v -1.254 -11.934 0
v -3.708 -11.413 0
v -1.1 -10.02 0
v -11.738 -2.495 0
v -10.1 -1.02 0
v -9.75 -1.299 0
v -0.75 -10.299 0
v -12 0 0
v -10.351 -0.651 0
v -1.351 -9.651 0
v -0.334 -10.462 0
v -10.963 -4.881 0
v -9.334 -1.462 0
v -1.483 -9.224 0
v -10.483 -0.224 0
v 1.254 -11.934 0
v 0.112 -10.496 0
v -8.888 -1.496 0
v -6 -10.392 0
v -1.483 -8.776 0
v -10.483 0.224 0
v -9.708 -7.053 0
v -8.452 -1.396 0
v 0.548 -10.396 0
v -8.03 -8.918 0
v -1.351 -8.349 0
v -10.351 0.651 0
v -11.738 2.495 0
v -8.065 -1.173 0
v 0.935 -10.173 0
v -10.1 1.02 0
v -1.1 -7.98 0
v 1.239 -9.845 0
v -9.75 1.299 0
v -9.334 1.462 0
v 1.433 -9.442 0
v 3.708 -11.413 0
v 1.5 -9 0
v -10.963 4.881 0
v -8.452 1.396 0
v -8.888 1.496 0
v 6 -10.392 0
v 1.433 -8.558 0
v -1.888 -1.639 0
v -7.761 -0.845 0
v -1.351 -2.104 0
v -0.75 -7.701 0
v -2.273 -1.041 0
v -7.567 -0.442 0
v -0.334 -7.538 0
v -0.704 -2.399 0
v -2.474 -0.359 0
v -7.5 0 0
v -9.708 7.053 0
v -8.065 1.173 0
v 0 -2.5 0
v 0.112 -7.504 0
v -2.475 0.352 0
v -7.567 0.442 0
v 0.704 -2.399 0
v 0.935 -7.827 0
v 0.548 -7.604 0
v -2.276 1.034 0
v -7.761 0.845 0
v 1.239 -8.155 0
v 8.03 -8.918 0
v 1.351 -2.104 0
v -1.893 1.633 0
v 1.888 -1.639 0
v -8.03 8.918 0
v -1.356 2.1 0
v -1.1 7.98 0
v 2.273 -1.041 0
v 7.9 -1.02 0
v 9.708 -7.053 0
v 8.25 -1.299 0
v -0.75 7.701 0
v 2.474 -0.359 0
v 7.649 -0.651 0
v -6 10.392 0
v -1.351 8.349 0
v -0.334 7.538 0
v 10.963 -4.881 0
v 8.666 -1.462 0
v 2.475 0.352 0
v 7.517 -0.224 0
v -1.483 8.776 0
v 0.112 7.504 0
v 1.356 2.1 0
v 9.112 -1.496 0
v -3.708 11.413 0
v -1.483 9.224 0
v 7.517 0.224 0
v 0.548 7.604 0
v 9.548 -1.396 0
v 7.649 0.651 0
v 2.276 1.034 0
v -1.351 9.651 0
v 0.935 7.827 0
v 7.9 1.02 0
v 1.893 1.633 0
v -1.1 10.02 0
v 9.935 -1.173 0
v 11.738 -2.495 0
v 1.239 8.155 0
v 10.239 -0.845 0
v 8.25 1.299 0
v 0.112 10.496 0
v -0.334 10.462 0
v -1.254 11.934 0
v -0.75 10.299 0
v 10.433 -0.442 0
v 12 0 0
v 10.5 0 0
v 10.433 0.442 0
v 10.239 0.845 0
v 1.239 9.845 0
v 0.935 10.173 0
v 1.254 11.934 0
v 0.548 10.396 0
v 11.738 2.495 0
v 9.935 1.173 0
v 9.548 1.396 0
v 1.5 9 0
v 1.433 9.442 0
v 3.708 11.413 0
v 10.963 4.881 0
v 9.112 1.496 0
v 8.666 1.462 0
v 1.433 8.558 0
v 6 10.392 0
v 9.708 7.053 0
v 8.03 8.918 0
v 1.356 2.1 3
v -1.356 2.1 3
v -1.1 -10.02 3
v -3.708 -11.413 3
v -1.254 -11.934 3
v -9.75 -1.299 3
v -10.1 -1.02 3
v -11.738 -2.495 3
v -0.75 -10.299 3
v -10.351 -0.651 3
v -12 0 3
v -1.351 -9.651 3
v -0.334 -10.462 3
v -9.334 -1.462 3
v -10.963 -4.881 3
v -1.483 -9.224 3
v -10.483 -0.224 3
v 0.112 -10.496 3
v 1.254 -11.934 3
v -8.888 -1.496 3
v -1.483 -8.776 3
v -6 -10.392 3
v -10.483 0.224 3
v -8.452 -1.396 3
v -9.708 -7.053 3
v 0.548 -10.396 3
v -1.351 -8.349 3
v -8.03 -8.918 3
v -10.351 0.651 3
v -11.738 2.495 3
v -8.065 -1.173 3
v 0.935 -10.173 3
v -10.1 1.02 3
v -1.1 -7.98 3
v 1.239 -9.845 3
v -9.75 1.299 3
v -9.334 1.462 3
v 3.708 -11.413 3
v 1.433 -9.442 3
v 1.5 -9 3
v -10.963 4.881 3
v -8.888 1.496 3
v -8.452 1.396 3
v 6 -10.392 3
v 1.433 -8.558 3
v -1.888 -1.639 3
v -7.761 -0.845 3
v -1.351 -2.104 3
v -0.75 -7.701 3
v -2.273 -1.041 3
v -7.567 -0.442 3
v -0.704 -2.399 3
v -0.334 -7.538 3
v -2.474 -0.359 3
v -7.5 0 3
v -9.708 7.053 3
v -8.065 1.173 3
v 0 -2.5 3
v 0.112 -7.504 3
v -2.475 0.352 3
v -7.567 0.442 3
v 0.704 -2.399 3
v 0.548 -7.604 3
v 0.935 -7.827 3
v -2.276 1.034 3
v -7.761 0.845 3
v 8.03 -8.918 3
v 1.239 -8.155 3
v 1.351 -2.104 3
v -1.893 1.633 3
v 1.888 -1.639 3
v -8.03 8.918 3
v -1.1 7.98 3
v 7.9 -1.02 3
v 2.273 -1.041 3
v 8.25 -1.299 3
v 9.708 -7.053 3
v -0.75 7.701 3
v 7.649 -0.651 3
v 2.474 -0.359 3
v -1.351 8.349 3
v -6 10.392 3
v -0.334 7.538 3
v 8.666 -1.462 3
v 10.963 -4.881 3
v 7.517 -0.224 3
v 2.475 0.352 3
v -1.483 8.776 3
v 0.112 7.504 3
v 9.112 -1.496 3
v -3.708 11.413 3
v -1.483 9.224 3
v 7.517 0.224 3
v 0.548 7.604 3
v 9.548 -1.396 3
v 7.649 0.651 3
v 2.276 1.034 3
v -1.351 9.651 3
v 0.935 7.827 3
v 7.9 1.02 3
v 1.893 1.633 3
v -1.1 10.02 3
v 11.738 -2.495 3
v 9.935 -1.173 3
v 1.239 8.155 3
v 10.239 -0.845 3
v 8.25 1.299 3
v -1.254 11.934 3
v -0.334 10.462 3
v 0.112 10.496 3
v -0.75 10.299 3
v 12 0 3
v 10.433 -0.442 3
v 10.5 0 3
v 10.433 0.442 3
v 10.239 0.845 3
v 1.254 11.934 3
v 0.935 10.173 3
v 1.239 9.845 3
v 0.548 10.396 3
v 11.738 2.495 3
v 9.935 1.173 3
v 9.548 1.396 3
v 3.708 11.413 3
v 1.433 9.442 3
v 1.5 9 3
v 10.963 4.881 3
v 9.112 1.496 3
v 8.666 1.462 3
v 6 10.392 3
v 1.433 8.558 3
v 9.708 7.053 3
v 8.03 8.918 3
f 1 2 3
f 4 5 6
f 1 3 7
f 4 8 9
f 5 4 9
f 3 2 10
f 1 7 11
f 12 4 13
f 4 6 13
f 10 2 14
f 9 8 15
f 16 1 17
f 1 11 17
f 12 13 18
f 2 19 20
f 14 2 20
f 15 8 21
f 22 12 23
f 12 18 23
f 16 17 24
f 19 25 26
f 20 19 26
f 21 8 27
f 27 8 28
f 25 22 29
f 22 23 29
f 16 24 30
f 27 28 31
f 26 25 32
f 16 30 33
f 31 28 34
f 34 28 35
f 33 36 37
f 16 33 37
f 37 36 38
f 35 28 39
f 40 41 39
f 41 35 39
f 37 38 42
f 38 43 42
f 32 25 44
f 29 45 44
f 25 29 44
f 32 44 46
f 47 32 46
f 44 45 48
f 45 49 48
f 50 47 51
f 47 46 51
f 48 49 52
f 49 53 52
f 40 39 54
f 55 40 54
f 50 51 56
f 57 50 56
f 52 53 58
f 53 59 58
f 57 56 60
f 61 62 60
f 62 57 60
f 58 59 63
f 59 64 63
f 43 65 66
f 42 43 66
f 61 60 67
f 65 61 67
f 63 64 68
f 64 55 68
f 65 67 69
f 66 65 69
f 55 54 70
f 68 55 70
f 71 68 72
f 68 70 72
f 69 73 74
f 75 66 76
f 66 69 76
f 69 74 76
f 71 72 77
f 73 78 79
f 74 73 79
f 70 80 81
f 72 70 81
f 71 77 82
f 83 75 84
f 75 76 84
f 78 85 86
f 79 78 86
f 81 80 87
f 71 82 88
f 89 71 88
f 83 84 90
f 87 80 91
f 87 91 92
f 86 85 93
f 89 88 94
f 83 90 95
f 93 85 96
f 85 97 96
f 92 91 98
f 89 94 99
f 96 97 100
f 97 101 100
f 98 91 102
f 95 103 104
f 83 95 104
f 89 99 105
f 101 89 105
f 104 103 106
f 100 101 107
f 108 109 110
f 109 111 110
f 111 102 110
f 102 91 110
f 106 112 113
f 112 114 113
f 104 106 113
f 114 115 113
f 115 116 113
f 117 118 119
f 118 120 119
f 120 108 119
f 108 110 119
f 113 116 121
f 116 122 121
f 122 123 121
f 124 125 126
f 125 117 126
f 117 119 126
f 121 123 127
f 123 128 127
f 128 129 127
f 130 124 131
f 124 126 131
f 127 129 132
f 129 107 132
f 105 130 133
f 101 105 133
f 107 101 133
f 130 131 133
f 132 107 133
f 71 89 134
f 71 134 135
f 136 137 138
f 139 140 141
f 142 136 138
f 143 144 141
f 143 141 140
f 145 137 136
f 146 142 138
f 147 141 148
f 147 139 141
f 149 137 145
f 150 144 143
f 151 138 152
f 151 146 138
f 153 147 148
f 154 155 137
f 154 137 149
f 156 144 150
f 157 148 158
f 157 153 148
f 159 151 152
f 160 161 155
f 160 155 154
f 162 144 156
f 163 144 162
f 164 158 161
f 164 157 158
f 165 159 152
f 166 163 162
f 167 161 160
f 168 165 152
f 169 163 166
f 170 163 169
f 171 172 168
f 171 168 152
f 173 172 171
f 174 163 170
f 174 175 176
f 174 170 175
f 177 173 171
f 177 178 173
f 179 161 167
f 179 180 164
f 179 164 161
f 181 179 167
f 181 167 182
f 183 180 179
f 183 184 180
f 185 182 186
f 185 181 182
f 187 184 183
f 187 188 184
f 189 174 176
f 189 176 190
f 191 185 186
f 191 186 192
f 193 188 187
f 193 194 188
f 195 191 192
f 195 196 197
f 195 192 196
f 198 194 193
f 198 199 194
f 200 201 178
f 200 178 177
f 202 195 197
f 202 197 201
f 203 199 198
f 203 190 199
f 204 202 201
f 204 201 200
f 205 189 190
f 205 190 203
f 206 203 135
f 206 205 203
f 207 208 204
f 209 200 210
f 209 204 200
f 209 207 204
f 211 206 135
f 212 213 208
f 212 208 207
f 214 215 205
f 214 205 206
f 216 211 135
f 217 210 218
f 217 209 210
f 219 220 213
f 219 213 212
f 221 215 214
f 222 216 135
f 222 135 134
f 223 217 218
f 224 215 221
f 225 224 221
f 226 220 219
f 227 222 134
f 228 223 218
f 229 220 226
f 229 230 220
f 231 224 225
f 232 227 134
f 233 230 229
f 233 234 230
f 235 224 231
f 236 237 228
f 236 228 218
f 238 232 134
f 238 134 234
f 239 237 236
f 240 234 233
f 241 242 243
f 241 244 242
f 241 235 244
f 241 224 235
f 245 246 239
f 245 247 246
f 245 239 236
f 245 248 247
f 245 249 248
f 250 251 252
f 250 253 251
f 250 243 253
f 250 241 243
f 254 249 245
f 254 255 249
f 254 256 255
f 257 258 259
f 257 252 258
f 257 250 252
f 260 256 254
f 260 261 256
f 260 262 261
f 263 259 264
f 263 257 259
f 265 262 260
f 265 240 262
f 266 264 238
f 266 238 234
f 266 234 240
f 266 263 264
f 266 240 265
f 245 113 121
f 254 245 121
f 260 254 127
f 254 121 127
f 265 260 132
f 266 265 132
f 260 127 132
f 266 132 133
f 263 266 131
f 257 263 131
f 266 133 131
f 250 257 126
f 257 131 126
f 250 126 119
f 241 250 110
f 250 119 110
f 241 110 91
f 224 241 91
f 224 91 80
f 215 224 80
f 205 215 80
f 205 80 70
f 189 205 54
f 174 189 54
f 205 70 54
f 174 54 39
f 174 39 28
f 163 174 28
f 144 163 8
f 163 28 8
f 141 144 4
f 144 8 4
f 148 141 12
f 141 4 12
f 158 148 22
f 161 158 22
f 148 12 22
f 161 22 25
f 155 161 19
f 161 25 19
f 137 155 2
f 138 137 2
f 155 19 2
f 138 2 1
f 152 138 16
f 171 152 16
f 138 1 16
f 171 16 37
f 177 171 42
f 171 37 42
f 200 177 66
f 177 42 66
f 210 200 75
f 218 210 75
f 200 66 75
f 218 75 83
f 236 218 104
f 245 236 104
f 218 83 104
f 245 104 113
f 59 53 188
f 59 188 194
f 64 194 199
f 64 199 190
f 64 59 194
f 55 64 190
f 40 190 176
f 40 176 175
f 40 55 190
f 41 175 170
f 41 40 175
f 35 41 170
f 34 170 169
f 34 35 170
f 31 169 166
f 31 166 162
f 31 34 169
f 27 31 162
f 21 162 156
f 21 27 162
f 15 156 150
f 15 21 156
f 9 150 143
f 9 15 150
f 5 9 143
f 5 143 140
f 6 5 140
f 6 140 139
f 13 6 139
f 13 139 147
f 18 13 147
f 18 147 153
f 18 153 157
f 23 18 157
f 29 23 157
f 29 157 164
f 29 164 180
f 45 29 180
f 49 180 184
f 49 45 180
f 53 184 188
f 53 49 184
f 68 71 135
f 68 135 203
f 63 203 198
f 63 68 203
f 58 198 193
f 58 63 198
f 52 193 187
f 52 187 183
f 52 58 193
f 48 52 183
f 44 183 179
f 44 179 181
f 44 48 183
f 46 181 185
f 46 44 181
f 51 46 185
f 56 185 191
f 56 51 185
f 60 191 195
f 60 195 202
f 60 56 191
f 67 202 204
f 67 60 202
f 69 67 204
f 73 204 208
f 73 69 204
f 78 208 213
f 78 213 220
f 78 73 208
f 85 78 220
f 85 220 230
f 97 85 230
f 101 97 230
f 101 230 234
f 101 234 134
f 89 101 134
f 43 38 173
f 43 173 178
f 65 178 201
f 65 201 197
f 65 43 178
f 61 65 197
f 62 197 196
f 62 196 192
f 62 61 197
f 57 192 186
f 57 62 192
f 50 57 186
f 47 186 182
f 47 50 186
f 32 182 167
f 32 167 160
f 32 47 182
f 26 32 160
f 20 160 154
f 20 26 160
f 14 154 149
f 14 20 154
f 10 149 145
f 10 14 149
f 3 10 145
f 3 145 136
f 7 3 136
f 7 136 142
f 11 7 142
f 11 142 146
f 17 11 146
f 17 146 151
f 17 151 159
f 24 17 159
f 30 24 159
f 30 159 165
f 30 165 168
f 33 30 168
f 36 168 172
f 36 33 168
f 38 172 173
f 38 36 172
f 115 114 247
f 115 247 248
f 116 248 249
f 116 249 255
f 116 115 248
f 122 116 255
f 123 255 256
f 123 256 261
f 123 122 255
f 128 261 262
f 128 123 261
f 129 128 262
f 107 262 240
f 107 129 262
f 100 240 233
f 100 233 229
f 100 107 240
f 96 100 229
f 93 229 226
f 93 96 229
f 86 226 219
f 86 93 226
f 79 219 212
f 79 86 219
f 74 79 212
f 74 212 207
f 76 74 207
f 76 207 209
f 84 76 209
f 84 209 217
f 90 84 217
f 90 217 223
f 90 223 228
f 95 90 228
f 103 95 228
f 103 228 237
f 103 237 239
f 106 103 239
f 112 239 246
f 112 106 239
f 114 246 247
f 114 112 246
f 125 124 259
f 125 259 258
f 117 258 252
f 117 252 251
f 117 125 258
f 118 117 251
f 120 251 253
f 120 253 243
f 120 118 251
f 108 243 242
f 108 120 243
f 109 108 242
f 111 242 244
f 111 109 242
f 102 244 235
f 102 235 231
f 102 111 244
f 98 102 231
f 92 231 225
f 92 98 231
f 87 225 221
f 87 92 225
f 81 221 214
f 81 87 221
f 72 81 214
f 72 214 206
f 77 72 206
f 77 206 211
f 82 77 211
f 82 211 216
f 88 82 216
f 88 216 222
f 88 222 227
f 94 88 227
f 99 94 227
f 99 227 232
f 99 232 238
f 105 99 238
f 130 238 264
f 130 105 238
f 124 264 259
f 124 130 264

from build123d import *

# Parameters (mm, degrees)
CROQUIS1_R              = 12
CROQUIS1_R_2            = 1.5
SALIENTE_EXTRUIR1_DEPTH = 3


with BuildPart() as part:
    # Croquis1 → Saliente-Extruir1 (new body)
    with BuildSketch(Plane.XY):
        Circle(CROQUIS1_R)
        with Locations((0, 9)):
            Circle(CROQUIS1_R_2, mode=Mode.SUBTRACT)
        with Locations((9, 0)):
            Circle(CROQUIS1_R_2, mode=Mode.SUBTRACT)
        with Locations((0, -9)):
            Circle(CROQUIS1_R_2, mode=Mode.SUBTRACT)
        with Locations((-9, 0)):
            Circle(CROQUIS1_R_2, mode=Mode.SUBTRACT)
        with BuildLine():
            Line((1.356465997, 2.1), (-1.356465997, 2.1))
            ThreePointArc((-1.356465997, 2.1), (0, -2.5), (1.356465997, 2.1))
        make_face(mode=Mode.SUBTRACT)
    extrude(amount=SALIENTE_EXTRUIR1_DEPTH)


solid = part.part
